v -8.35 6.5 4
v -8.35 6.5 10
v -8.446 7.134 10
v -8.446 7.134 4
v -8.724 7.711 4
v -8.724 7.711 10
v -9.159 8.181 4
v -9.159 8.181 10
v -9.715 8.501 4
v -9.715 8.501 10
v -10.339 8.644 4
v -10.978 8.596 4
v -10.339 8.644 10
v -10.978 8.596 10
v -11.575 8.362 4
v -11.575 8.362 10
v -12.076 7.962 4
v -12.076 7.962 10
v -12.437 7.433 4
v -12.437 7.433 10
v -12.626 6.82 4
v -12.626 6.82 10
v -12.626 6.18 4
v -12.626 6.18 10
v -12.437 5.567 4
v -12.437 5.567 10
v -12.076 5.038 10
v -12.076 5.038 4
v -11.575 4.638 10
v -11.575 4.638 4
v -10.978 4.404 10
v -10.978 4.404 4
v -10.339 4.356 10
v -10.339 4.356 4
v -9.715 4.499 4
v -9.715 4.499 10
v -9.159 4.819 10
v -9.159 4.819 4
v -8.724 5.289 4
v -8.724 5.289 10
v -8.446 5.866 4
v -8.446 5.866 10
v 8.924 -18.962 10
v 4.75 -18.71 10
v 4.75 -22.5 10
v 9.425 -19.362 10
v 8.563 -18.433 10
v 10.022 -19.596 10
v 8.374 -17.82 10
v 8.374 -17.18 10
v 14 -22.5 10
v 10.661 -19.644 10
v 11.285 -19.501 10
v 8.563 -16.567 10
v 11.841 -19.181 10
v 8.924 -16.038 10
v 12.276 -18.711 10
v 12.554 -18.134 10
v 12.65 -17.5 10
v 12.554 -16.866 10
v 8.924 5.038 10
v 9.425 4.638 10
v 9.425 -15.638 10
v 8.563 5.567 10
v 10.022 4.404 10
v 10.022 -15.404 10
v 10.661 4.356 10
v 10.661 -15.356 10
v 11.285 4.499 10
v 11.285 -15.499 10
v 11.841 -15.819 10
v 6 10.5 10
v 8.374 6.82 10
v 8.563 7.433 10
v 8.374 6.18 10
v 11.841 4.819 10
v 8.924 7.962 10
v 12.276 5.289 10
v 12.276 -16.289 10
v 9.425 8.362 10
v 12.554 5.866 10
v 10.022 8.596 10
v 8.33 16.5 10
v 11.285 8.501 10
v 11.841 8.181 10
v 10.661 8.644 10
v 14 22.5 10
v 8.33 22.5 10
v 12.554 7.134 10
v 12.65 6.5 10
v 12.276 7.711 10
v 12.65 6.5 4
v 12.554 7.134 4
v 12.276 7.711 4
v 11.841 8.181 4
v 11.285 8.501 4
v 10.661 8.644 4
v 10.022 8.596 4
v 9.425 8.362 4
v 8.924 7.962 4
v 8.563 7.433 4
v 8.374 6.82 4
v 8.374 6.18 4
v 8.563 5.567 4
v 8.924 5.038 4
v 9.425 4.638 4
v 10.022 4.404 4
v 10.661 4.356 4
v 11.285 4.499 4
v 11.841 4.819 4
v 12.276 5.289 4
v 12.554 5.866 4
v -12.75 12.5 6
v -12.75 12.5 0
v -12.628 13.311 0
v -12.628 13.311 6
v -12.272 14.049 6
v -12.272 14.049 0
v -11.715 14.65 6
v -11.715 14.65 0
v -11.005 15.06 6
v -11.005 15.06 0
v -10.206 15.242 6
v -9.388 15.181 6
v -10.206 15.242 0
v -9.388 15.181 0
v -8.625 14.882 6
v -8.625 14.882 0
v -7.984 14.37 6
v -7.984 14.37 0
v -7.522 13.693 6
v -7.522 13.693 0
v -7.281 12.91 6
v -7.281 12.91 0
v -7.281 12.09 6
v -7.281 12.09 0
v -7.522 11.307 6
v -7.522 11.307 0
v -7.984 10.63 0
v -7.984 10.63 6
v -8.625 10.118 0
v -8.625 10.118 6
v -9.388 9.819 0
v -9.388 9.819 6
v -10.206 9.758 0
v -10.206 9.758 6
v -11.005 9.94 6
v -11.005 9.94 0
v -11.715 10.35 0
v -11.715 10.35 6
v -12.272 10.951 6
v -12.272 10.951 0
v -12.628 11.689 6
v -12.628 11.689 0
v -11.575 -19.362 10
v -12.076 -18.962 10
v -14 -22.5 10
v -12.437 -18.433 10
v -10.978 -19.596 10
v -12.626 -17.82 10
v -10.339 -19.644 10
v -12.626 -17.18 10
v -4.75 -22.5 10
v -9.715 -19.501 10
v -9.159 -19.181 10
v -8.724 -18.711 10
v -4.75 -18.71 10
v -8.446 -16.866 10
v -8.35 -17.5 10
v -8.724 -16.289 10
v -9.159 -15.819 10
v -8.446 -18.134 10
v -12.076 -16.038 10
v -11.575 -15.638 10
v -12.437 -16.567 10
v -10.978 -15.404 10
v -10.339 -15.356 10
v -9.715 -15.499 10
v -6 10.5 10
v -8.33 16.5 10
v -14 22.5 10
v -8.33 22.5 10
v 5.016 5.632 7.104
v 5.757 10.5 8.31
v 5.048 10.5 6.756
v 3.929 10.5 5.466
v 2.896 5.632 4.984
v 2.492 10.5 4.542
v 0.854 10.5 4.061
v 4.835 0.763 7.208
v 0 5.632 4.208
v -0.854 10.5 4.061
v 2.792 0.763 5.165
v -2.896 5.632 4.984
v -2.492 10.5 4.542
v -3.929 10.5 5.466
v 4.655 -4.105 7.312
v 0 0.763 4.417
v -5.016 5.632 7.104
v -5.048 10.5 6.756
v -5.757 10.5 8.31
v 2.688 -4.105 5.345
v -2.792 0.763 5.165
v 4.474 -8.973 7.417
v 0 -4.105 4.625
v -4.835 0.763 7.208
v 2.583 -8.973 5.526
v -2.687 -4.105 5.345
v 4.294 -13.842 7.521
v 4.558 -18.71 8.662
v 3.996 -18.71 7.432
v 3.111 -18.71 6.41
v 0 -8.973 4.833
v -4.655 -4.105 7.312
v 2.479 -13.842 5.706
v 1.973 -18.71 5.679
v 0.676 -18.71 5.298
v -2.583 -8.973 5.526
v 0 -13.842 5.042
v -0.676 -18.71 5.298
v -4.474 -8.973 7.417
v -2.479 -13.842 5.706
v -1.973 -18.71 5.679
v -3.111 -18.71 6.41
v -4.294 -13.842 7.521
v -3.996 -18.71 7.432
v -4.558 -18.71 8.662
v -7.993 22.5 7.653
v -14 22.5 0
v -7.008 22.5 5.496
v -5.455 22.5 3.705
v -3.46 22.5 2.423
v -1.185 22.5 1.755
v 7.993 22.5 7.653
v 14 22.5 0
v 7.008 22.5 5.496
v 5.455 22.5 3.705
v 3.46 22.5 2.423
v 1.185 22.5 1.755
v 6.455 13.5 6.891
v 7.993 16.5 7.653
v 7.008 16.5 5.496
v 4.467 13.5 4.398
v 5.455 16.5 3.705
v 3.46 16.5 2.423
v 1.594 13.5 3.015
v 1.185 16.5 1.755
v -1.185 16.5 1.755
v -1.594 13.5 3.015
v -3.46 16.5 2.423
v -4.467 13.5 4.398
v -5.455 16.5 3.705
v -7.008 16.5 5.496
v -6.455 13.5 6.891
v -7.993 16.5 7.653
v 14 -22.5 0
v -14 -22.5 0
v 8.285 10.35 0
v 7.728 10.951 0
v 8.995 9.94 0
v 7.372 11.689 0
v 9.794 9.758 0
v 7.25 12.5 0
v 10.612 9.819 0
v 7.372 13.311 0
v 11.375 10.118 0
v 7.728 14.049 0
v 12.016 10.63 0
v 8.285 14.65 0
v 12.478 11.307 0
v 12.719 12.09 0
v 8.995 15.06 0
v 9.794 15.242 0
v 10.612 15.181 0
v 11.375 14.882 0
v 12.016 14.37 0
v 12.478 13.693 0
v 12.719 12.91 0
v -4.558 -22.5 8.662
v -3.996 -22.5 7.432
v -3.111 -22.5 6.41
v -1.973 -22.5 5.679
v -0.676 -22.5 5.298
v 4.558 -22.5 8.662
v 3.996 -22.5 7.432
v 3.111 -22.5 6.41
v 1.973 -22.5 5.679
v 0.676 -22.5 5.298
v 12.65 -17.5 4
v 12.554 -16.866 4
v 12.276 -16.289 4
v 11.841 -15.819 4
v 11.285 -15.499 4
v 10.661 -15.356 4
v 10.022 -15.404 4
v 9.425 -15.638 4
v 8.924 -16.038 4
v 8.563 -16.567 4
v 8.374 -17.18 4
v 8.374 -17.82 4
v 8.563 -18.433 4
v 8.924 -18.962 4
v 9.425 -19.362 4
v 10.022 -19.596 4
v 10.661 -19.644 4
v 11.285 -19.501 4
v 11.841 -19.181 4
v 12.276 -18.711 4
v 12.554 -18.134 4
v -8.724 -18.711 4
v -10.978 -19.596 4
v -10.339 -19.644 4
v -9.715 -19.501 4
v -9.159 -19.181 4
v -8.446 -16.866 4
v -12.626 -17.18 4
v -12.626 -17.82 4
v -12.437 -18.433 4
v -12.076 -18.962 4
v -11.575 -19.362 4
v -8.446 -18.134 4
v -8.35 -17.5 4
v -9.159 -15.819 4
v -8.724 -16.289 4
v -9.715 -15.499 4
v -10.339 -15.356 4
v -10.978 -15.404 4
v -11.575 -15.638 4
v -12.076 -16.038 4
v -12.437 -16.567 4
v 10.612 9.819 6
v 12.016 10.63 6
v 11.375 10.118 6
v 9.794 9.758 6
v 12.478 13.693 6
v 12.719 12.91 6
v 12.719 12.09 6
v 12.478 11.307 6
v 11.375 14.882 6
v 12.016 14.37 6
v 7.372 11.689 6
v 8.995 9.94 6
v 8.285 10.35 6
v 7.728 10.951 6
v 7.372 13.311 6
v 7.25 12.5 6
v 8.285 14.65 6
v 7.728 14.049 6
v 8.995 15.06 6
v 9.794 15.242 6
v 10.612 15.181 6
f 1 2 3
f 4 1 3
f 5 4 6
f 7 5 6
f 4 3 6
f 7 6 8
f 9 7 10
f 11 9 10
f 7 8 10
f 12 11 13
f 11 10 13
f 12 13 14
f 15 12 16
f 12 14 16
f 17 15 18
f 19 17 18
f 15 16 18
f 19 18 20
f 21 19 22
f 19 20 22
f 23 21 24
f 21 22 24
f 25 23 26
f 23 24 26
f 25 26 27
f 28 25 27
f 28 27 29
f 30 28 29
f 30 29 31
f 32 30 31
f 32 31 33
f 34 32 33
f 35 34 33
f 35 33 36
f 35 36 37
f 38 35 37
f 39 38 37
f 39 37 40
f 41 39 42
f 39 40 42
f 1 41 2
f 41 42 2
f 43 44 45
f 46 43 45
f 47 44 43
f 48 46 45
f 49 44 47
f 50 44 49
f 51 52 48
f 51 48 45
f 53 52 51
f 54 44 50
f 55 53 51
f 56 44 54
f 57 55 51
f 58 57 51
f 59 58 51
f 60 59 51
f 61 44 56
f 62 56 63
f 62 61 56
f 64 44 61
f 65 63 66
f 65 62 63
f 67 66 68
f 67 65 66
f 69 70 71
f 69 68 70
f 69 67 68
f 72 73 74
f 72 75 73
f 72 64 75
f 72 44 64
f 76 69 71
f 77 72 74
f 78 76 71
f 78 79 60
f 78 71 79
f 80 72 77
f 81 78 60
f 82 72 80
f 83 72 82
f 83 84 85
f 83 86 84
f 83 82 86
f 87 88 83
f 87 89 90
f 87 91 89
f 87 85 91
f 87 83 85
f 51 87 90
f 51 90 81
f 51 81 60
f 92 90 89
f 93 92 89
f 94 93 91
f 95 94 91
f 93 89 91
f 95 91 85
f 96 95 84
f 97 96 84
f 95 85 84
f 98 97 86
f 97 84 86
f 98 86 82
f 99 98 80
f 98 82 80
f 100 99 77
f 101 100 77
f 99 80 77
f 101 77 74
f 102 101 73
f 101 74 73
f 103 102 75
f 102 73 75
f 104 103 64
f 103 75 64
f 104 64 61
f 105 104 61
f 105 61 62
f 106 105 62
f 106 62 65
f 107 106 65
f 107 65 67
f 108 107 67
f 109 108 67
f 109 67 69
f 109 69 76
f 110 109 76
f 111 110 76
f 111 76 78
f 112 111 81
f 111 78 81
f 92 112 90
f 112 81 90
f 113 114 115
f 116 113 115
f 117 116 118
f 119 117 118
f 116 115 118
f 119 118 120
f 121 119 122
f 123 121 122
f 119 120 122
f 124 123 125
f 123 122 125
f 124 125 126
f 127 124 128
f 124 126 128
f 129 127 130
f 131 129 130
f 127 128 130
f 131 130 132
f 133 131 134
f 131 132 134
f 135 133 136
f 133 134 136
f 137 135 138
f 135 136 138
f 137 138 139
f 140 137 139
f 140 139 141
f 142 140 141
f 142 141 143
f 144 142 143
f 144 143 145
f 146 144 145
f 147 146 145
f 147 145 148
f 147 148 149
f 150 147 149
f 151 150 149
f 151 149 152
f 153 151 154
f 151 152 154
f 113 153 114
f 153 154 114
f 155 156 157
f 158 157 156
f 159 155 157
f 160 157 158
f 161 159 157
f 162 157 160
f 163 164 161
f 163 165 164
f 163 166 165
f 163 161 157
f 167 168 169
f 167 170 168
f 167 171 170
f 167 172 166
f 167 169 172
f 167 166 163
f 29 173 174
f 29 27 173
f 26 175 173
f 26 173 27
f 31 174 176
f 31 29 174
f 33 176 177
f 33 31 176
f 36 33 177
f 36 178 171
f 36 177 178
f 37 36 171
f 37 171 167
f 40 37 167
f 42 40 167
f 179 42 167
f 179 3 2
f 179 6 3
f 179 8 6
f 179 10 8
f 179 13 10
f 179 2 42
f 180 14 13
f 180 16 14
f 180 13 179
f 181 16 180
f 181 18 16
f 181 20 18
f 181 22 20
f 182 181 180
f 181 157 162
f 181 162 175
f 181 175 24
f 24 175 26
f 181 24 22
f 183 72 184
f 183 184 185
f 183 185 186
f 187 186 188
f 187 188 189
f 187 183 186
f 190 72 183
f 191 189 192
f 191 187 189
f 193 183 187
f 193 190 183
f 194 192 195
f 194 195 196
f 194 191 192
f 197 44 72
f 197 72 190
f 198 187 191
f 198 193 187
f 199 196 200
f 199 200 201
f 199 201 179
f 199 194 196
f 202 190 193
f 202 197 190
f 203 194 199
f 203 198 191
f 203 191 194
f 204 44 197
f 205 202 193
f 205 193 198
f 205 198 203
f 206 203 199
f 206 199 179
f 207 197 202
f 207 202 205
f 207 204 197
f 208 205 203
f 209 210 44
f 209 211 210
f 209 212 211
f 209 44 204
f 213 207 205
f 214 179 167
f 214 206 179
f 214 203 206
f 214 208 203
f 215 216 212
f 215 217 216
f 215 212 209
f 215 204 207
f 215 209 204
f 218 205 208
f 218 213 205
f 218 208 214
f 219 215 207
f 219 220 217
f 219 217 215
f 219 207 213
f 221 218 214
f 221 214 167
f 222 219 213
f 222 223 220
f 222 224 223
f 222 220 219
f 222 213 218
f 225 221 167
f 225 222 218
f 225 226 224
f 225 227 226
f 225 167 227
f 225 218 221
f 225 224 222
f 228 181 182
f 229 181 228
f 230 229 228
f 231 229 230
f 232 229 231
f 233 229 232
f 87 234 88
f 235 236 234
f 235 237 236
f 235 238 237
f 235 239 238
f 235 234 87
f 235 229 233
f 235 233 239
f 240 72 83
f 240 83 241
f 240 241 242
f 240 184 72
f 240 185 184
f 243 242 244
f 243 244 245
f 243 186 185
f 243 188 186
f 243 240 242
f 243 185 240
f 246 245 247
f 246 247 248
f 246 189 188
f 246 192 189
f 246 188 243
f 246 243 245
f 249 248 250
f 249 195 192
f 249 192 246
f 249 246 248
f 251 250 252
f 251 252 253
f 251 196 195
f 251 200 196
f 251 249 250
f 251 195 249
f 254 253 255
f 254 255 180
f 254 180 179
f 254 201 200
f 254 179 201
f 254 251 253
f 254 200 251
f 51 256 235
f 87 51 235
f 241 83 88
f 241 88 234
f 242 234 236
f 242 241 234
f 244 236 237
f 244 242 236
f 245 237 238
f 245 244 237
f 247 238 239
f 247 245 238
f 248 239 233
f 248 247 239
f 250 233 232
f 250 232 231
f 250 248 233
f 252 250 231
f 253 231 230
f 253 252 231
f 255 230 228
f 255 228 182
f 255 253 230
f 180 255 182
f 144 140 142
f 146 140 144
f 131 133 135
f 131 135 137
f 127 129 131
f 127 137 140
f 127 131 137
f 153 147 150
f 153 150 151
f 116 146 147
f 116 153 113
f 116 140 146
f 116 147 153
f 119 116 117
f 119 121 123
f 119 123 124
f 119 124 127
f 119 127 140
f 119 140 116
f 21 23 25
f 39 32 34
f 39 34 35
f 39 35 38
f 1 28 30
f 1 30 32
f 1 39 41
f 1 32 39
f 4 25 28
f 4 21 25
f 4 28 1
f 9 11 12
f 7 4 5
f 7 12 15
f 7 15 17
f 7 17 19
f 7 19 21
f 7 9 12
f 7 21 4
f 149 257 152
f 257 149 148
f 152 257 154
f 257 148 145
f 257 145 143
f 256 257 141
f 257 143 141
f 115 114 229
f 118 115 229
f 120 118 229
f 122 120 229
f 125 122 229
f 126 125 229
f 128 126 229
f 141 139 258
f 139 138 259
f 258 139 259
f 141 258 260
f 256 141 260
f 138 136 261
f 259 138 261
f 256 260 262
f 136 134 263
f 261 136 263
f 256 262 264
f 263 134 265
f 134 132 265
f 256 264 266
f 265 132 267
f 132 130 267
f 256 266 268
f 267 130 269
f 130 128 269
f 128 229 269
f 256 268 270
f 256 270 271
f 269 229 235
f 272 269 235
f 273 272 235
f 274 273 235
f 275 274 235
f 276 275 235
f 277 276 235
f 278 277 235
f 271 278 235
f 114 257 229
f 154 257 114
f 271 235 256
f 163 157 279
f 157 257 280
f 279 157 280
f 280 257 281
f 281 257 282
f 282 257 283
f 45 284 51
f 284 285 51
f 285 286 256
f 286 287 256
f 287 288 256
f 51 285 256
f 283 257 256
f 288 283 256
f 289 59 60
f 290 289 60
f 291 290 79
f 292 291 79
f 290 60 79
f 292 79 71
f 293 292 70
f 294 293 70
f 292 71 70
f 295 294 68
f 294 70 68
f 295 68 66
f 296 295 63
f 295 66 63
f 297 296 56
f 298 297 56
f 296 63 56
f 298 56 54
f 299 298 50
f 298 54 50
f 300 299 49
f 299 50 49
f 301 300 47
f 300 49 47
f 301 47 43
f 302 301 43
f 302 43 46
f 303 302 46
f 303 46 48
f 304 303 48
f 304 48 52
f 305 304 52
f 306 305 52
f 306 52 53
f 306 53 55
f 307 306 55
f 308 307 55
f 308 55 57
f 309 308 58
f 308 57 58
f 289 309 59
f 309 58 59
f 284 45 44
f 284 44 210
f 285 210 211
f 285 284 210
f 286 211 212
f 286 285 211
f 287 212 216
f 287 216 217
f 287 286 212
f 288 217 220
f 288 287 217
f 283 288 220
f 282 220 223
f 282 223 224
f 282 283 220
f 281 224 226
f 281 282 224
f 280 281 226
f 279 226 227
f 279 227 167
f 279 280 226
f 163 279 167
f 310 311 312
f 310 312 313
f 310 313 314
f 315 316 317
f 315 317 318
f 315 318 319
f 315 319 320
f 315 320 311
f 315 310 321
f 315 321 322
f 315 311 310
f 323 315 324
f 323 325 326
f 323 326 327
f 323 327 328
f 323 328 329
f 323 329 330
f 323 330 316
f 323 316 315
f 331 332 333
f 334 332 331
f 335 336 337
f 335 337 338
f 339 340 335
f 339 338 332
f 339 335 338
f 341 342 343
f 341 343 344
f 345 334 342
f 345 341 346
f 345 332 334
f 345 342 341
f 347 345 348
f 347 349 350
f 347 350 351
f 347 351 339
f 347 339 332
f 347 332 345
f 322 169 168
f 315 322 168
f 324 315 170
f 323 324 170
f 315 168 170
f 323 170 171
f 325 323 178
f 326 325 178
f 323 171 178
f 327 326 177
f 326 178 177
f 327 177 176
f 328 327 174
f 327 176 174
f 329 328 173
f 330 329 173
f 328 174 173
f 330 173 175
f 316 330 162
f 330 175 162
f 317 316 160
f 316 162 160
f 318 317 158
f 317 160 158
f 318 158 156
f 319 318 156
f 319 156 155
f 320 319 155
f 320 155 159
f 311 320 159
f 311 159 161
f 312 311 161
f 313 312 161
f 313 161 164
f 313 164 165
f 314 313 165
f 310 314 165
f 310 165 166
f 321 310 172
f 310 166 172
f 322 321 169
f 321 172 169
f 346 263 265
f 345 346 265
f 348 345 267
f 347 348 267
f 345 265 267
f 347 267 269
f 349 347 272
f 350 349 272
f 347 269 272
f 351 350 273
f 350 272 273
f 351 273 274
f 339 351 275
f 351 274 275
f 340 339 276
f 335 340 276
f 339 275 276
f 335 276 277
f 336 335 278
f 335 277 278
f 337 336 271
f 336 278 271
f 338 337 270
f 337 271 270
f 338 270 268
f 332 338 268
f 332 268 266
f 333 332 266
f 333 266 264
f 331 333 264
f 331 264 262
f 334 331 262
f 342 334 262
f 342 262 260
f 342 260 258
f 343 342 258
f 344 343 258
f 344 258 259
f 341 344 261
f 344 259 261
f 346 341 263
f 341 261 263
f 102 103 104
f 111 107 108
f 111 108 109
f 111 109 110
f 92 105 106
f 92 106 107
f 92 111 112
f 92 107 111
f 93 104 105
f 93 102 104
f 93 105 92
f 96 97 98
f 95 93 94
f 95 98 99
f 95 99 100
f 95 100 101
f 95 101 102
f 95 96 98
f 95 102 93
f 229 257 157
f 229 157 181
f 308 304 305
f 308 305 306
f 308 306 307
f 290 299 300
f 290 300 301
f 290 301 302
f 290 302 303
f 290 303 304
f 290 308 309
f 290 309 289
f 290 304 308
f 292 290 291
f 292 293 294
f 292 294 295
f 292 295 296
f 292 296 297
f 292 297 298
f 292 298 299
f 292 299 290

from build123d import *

# Parameters (mm, degrees)
SKETCH4_W           = 28
SKETCH4_H           = 45
BOSS_EXTRUDE2_DEPTH = 10
SKETCH6_R           = 2.15
CUT_EXTRUDE1_DEPTH  = 6
SKETCH7_R           = 2.75
CUT_EXTRUDE2_DEPTH  = 6


with BuildPart() as part:
    # Sketch4 → Boss-Extrude2 (new body)
    with BuildSketch(Plane.XY):
        Rectangle(SKETCH4_W, SKETCH4_H)
    extrude(amount=BOSS_EXTRUDE2_DEPTH)

    # Sketch5 → Cut-Revolve1 (revolve, cut)
    with BuildSketch(Plane.XY.offset(10)):
        Polygon((0, 22.5), (8.33, 22.5), (8.33, 16.5), (6, 10.5), (4.75, -18.71), (4.75, -22.5), (0, -22.5), align=None)
    revolve(axis=Axis((0, 0, 10), (0, 1, 0)), mode=Mode.SUBTRACT)

    # Sketch6 → Cut-Extrude1 (cut)
    with BuildSketch(Plane.XY.offset(10)):
        with Locations((-10.5, 6.5)):
            Circle(SKETCH6_R)
        with Locations((-10.5, -17.5)):
            Circle(SKETCH6_R)
        with Locations((10.5, 6.5)):
            Circle(SKETCH6_R)
        with Locations((10.5, -17.5)):
            Circle(SKETCH6_R)
    extrude(amount=-CUT_EXTRUDE1_DEPTH, mode=Mode.SUBTRACT)

    # Sketch7 → Cut-Extrude2 (cut)
    with BuildSketch(Plane(origin=(0, 0, 0), x_dir=(-1, 0, 0), z_dir=(0, 0, -1))):
        with Locations((-10, 12.5)):
            Circle(SKETCH7_R)
        with Locations((10, 12.5)):
            Circle(SKETCH7_R)
    extrude(amount=-CUT_EXTRUDE2_DEPTH, mode=Mode.SUBTRACT)


solid = part.part
